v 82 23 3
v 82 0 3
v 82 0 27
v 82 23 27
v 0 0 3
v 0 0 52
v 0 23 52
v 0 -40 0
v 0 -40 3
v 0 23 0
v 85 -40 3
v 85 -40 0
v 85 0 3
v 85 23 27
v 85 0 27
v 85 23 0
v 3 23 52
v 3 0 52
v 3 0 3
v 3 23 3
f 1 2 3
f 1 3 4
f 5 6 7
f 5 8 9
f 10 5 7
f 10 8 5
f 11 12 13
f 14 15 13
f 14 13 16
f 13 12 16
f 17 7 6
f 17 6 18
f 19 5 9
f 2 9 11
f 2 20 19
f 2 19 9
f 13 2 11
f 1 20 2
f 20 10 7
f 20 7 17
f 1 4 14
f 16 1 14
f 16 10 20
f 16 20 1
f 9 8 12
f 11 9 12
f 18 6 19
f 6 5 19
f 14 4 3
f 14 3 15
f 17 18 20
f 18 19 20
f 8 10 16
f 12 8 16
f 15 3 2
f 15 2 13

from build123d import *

# Parameters (mm, degrees)
F0_W     = 85
F0_H     = 23
F0_H_2   = 40
F1_DEPTH = 3
F2_W     = 3
F2_H     = 23
F3_DEPTH = 24
F4_W     = 3
F4_H     = 23
F5_DEPTH = 25


with BuildPart() as f1:
    # F0 (on Top) → F1 (new body)
    with BuildSketch(Plane.XY):
        with Locations((42.5, 11.5)):
            Rectangle(F0_W, F0_H)
        with Locations((42.5, -20)):
            Rectangle(F0_W, F0_H_2)
    extrude(amount=F1_DEPTH)

    # F2 (on face) → F3 (join)
    with BuildSketch(Plane.XY.offset(3)):
        with Locations((1.5, 11.5)):
            Rectangle(F2_W, F2_H)
        with Locations((83.5, 11.5)):
            Rectangle(F2_W, F2_H)
    extrude(amount=F3_DEPTH)

    # F4 (on face) → F5 (join)
    with BuildSketch(Plane.XY.offset(27)):
        with Locations((1.5, 11.5)):
            Rectangle(F4_W, F4_H)
    extrude(amount=F5_DEPTH)


solid = f1.part
